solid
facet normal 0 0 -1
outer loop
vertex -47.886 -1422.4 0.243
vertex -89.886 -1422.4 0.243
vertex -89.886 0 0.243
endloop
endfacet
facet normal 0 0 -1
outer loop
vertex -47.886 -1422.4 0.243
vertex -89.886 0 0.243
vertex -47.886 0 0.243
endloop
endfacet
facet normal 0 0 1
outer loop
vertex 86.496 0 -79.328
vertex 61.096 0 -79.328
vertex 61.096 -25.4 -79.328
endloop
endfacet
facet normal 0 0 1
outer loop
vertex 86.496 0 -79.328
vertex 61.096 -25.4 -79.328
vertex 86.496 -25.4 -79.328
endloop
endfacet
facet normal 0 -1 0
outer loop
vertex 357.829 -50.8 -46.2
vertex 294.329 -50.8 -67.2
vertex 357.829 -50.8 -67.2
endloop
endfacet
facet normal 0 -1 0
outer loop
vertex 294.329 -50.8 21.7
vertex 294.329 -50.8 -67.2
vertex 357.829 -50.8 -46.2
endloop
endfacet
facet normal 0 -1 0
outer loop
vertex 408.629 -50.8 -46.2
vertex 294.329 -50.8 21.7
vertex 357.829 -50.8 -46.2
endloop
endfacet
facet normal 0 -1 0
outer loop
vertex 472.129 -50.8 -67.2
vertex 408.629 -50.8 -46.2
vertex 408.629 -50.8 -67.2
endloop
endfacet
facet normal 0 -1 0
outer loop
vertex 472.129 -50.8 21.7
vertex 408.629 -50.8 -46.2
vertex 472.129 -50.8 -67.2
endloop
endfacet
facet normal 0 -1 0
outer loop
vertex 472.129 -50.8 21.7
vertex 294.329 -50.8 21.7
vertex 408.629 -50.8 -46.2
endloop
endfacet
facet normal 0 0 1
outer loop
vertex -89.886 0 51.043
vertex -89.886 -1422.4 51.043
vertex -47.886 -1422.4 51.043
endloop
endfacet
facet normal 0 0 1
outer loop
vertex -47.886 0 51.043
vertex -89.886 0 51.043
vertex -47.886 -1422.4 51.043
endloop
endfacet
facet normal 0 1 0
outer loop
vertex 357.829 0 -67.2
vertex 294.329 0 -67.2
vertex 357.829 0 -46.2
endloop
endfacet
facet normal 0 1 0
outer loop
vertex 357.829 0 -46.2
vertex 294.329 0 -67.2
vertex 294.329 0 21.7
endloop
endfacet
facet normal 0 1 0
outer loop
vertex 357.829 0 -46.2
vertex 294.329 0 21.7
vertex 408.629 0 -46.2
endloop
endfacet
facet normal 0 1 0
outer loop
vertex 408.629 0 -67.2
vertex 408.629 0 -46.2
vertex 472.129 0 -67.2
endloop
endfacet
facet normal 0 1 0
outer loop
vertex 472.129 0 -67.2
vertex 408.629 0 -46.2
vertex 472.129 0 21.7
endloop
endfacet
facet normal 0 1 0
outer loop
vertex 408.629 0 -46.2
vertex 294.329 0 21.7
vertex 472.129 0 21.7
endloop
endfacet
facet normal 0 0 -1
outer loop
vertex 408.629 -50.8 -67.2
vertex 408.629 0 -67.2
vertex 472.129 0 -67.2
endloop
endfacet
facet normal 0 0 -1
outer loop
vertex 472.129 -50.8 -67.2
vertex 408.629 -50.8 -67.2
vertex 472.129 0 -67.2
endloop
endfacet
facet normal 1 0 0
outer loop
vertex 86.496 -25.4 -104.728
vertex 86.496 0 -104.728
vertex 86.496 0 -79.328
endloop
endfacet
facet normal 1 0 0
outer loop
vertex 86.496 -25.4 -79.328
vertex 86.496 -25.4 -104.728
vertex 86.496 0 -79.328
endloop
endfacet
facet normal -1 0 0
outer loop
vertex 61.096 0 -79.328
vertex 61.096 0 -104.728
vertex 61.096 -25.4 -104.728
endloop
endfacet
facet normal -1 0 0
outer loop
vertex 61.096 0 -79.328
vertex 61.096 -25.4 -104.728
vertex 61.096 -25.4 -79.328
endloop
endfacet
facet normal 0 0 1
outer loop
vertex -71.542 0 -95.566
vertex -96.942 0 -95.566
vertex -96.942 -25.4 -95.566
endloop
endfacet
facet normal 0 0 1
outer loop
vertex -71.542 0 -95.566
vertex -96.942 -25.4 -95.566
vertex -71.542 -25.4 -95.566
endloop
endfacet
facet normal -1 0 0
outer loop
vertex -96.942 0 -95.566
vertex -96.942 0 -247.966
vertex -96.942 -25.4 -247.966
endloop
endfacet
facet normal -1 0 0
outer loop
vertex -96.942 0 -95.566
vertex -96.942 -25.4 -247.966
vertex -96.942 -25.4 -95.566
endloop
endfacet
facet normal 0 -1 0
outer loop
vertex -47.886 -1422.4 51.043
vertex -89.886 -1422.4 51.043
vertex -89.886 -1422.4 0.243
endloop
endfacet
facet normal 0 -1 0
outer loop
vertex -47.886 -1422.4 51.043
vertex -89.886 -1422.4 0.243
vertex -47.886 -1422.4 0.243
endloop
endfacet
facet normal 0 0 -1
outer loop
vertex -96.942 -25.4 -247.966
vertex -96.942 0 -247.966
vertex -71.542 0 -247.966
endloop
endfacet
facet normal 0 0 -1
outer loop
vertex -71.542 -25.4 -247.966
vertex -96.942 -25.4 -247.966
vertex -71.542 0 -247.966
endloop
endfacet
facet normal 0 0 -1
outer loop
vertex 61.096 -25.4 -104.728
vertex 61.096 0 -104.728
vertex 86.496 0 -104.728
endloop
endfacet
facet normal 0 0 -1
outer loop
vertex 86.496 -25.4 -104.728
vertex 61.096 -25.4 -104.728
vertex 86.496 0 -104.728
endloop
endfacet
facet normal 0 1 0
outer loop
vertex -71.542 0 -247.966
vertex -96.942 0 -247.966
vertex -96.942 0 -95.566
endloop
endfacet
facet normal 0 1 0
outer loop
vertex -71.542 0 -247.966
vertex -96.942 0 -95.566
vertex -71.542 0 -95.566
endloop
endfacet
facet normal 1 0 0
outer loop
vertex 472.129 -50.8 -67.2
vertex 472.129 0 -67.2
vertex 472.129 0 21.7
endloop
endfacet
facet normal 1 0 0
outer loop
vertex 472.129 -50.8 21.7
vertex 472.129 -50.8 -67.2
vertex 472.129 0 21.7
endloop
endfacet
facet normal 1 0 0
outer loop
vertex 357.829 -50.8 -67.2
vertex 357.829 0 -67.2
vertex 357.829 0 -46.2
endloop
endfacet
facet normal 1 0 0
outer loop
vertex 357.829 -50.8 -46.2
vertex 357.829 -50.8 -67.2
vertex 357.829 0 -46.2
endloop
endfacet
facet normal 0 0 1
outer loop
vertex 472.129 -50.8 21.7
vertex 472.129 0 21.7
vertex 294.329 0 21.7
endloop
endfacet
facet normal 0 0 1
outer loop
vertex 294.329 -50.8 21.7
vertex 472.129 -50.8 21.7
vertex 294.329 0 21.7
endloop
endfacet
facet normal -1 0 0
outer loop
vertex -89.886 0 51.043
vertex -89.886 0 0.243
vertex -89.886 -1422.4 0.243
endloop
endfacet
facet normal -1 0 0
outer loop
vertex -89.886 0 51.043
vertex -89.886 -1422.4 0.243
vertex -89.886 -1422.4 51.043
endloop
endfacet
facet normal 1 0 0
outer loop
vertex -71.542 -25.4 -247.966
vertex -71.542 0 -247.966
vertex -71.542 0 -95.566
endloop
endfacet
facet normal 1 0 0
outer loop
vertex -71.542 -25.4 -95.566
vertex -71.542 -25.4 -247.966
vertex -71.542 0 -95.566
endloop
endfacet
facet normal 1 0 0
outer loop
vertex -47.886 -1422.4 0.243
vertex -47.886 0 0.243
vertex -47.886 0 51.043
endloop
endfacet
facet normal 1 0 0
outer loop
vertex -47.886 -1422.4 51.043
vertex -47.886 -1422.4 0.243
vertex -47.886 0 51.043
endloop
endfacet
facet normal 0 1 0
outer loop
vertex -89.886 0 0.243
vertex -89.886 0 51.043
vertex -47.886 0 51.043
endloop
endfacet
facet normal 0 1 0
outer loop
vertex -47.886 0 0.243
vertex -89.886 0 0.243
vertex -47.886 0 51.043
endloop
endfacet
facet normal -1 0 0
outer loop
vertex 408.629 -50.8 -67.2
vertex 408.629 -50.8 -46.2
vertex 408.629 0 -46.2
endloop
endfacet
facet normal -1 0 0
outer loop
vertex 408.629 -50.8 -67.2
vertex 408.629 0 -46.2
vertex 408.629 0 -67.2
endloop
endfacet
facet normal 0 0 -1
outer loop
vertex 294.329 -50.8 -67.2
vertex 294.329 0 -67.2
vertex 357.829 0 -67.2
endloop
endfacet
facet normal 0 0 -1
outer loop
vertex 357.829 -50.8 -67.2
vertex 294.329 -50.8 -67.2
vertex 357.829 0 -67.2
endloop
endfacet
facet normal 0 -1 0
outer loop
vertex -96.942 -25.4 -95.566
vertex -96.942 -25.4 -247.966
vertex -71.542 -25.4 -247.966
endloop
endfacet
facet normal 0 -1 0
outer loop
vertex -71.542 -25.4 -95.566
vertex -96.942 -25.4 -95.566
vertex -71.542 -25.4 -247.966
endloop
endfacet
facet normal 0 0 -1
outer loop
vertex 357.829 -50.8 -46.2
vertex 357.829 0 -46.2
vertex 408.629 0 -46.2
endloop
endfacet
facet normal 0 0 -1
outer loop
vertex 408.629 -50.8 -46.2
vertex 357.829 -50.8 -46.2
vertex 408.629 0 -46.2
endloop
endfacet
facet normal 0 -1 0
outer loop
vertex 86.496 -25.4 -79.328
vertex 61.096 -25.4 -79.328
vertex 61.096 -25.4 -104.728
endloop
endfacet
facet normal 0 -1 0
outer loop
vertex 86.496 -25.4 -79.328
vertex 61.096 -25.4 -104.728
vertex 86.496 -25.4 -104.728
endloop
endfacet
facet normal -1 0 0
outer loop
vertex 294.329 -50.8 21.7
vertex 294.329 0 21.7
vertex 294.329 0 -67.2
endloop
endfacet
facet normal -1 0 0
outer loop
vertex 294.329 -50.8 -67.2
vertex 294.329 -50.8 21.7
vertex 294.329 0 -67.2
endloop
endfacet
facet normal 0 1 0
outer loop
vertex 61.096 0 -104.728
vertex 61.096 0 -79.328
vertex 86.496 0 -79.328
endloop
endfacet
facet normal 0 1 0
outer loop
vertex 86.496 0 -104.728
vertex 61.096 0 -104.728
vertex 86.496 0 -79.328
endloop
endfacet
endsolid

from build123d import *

# Parameters (mm, degrees)
F1_DEPTH = 50.8
F0_W     = 42
F0_H     = 50.8
F2_DEPTH = 1422.4
F0_W_2   = 25.4
F0_H_2   = 25.4
F3_DEPTH = 25.4
F0_H_3   = 152.4


# Not quite as in the source:
# - a feature names something its author has since deleted; it is built from what else it names


with BuildPart() as f1:
    # F0 (on Front) → F1 (new body)
    with BuildSketch(Plane.XZ):
        Polygon((472.1291068077, 21.6997341752), (294.3291068077, 21.6997341752), (294.3291068077, -67.2002658248), (357.8291068077, -67.2002658248), (357.8291068077, -46.2002658248), (408.6291068077, -46.2002658248), (408.6291068077, -67.2002658248), (472.1291068077, -67.2002658248), align=None)
    extrude(amount=F1_DEPTH)


with BuildPart() as f2:
    # F0 (on Front) → F2 (new body)
    with BuildSketch(Plane.XZ):
        with Locations((-68.8863479115, 25.6433247801)):
            Rectangle(F0_W, F0_H)
    extrude(amount=F2_DEPTH)


with BuildPart() as f3:
    # F0 (on Front) → F3 (new body)
    with BuildSketch(Plane.XZ):
        with Locations((73.7957331955, -92.0277962789)):
            Rectangle(F0_W_2, F0_H_2)
    extrude(amount=F3_DEPTH)


with BuildPart() as f3b:
    # F0 (on Front) → F3, piece 2 (new body)
    with BuildSketch(Plane.XZ):
        with Locations((-84.2424545765, -171.7660920799)):
            Rectangle(F0_W_2, F0_H_3)
    extrude(amount=F3_DEPTH)


solid = Compound([f1.part, f2.part, f3.part, f3b.part])
